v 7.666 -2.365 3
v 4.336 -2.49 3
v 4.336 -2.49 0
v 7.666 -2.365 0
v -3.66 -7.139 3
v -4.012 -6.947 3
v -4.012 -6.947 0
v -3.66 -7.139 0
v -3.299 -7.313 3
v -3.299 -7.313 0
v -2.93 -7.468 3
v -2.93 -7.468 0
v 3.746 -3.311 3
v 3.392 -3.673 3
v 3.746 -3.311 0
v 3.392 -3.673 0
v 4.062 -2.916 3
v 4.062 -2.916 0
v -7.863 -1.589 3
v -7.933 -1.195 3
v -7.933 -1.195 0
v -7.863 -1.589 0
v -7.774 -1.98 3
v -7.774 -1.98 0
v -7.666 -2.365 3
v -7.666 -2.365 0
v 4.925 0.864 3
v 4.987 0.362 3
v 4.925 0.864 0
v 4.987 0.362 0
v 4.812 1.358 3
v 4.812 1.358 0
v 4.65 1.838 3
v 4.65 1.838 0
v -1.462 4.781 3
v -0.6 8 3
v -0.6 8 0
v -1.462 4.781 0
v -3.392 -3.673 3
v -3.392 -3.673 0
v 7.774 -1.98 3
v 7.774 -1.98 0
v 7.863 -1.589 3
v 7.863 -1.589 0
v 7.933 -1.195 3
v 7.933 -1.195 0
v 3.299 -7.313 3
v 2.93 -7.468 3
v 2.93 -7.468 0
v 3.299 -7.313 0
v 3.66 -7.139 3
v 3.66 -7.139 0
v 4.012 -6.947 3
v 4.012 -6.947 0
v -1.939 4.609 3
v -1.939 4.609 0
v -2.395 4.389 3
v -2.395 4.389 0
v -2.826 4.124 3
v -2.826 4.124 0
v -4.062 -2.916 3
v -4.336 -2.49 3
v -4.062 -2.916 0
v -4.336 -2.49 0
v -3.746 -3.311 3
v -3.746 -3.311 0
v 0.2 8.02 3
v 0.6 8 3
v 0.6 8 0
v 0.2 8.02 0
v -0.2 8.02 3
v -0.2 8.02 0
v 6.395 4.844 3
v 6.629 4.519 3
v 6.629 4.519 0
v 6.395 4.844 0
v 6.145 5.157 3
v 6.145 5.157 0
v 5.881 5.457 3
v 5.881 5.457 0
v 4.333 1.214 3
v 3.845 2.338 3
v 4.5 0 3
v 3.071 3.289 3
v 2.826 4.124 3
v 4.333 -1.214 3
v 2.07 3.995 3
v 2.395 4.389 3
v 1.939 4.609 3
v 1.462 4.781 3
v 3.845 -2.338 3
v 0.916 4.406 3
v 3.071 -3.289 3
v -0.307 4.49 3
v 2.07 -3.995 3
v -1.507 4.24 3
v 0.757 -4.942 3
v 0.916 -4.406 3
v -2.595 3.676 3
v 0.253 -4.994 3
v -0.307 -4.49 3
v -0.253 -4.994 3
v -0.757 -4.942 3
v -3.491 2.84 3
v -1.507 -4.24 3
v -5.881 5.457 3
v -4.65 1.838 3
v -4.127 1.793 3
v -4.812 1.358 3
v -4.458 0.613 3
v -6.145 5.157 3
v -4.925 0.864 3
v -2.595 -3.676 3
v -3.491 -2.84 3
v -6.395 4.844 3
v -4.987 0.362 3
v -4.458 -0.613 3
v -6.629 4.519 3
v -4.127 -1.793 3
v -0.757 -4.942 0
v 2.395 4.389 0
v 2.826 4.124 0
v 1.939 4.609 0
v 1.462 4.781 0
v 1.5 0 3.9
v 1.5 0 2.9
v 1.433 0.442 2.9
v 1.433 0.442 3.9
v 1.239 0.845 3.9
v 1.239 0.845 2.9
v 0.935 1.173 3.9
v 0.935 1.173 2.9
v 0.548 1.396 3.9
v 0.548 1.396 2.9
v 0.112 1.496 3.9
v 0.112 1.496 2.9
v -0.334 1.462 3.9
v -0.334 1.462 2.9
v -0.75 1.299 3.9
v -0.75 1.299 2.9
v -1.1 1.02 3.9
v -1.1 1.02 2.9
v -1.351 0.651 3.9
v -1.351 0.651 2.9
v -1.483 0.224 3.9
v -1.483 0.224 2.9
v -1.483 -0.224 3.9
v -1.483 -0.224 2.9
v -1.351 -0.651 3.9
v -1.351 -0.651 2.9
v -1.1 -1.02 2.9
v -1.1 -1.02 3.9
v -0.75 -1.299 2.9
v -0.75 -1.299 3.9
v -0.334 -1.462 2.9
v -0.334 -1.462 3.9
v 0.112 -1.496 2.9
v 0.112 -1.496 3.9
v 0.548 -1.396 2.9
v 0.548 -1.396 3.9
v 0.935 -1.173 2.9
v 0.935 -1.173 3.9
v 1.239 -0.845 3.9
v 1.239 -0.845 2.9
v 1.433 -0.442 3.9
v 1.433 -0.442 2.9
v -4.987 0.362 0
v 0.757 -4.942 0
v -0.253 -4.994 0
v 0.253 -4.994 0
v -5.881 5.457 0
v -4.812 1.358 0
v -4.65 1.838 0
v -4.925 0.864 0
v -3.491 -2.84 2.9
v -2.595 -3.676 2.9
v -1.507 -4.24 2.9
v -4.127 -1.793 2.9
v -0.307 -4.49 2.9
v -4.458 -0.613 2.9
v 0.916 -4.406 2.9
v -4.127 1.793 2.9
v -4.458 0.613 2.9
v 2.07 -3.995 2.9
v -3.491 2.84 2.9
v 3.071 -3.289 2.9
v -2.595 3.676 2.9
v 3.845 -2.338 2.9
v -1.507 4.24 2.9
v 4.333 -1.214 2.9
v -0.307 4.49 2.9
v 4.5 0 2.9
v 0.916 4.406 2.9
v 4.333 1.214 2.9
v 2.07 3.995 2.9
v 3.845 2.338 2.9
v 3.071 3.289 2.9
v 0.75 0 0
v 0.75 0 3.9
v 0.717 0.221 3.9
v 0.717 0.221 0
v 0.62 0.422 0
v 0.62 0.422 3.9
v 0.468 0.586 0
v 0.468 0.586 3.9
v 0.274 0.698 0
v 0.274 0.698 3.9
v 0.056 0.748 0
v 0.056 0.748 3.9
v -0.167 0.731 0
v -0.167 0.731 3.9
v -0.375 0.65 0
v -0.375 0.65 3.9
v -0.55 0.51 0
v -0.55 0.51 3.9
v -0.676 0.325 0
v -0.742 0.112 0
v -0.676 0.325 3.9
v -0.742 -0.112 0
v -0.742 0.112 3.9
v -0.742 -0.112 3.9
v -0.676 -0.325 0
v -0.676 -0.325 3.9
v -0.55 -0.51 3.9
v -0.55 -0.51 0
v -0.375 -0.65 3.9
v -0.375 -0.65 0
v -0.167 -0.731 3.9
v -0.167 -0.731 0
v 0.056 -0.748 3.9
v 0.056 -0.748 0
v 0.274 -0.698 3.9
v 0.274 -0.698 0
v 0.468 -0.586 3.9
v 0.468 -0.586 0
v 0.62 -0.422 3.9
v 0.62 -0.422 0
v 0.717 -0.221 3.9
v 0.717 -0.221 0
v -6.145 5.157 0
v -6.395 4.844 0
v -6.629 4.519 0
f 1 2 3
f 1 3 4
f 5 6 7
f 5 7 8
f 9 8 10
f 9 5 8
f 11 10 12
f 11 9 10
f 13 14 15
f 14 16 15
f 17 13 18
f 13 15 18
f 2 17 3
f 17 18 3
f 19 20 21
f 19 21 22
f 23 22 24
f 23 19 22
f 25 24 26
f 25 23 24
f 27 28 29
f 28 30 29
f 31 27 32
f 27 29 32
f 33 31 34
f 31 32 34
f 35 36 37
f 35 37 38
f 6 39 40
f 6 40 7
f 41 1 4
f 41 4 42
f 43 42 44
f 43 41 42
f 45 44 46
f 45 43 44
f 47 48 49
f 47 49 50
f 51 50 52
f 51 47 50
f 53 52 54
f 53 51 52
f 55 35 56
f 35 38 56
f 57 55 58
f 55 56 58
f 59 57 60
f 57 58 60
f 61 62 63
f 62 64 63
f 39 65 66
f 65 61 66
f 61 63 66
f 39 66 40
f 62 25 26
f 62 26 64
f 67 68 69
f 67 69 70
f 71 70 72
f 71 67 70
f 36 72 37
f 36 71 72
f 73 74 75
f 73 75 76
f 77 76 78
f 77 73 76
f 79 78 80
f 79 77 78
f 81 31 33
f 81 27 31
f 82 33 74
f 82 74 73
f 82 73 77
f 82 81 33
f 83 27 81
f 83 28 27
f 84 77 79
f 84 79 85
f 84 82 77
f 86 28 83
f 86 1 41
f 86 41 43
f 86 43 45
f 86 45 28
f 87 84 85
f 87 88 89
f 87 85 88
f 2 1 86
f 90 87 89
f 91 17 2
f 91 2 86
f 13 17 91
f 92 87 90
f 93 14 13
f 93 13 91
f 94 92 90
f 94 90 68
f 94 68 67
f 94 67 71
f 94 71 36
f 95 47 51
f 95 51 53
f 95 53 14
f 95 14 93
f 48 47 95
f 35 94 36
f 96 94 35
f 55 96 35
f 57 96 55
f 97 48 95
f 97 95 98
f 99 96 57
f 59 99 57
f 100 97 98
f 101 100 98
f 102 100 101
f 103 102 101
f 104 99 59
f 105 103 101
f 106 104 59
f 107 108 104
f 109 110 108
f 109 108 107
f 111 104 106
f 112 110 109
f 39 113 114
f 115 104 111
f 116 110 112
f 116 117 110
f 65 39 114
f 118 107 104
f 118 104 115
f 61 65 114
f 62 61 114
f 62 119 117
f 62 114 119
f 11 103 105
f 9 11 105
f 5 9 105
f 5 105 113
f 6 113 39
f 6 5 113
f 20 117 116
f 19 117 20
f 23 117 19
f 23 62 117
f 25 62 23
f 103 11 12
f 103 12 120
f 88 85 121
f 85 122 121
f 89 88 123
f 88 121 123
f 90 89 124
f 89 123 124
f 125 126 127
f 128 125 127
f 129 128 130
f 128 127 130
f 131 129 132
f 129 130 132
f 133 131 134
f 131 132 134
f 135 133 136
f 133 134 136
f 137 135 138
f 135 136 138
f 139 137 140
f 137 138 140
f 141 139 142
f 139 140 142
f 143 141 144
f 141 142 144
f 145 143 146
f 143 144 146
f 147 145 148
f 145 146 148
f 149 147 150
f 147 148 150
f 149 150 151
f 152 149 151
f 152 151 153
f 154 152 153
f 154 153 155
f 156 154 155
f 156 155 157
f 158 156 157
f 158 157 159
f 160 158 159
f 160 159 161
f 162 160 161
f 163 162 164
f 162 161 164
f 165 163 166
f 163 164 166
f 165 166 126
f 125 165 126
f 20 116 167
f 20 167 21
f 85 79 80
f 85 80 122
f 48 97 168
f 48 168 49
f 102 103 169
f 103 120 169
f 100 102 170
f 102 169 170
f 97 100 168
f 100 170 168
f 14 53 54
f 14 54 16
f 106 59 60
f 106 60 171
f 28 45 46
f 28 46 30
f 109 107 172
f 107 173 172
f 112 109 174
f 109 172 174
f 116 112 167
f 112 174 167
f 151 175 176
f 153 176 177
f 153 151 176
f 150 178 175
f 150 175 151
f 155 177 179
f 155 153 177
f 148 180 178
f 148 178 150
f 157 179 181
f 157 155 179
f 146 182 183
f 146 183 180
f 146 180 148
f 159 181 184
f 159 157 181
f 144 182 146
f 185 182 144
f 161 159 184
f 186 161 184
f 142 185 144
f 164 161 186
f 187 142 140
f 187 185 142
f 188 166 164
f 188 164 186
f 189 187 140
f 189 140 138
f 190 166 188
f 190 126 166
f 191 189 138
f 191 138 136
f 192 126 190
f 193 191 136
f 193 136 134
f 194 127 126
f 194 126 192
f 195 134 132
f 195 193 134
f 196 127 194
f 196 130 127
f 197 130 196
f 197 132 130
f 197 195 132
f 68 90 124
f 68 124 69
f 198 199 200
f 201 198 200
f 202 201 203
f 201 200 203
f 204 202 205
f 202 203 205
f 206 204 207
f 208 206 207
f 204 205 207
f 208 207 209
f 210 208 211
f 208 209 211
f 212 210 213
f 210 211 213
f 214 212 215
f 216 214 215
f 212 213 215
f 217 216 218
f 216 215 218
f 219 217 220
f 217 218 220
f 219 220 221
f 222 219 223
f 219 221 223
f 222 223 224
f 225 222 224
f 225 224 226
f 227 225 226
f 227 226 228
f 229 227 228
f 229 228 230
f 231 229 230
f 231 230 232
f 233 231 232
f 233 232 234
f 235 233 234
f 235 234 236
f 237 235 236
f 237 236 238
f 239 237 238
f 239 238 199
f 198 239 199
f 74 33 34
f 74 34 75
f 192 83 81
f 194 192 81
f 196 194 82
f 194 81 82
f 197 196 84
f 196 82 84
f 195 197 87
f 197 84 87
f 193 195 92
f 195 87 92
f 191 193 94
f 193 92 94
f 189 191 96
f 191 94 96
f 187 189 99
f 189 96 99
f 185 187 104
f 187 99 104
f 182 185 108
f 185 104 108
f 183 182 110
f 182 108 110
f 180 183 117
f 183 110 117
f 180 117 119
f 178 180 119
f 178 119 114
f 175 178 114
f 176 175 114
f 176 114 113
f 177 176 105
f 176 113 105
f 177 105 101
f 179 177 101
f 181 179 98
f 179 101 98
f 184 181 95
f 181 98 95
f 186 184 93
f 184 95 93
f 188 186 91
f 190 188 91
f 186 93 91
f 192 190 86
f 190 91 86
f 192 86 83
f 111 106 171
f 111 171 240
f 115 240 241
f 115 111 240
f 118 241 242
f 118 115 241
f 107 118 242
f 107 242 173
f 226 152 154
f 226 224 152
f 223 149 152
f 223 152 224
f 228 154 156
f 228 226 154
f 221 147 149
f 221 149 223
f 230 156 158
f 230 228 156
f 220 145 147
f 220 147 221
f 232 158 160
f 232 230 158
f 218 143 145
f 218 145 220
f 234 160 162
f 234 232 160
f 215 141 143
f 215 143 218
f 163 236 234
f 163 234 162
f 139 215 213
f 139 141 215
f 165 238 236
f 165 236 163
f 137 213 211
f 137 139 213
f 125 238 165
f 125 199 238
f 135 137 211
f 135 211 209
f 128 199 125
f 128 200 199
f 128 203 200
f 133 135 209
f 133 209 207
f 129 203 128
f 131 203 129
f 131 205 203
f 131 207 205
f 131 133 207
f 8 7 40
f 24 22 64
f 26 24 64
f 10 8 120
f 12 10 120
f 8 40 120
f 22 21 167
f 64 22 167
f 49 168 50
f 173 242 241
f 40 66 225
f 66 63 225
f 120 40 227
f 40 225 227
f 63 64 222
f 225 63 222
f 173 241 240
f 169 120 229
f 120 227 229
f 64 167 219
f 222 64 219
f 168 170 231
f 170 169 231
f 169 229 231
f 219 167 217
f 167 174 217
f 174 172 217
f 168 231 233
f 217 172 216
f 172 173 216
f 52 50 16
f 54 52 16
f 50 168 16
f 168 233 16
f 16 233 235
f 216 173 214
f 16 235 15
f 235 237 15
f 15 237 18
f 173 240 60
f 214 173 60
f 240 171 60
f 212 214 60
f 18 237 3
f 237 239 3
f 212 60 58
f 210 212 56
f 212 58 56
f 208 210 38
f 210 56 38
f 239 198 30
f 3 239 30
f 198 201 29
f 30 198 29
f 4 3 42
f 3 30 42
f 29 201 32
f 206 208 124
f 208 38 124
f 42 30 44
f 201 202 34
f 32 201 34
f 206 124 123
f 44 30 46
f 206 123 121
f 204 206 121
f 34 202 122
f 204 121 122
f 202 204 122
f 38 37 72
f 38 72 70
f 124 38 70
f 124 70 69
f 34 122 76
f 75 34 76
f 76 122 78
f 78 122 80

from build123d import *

# Parameters (mm, degrees)
SKETCH1_R           = 5
BOSS_EXTRUDE1_DEPTH = 3
BOSS_EXTRUDE2_DEPTH = 3
CIRPATTERN2_COUNT   = 7
SKETCH3_R           = 4.5
CUT_EXTRUDE1_DEPTH  = 0.1
SKETCH4_R           = 1.5
BOSS_EXTRUDE3_DEPTH = 1
SKETCH5_R           = 0.75
CUT_EXTRUDE2_DEPTH  = 12.937398013


with BuildPart() as part:
    # Sketch1 → Boss-Extrude1 (new body)
    with BuildSketch(Plane.XY):
        Circle(SKETCH1_R)
    extrude(amount=BOSS_EXTRUDE1_DEPTH)

    # Sketch2 → Boss-Extrude2 (add)
    with BuildSketch(Plane.XY.offset(3)):
        with BuildLine():
            Line((-1.46243537, 4.781347382), (1.46243537, 4.781347382))
            Line((1.46243537, 4.781347382), (0.6, 8))
            ThreePointArc((0.6, 8), (0, 8.022468448), (-0.6, 8))
            Line((-0.6, 8), (-1.46243537, 4.781347382))
        make_face()
    boss_extrude2 = extrude(amount=-BOSS_EXTRUDE2_DEPTH)

    # CirPattern2: Boss-Extrude2 ×7 about axis
    cirpattern2_axis = Axis((0, 0, 0), (0, 0, 1))
    for i in range(1, CIRPATTERN2_COUNT):
        add(boss_extrude2.rotate(cirpattern2_axis, i * 360 / CIRPATTERN2_COUNT))

    # Sketch3 → Cut-Extrude1 (cut)
    with BuildSketch(Plane.XY.offset(3)):
        Circle(SKETCH3_R)
    extrude(amount=-CUT_EXTRUDE1_DEPTH, mode=Mode.SUBTRACT)

    # Sketch4 → Boss-Extrude3 (add)
    with BuildSketch(Plane.XY.offset(2.9)):
        Circle(SKETCH4_R)
    extrude(amount=BOSS_EXTRUDE3_DEPTH)

    # Sketch5 → Cut-Extrude2 (cut, through all)
    with BuildSketch(Plane.XY.offset(3.9)):
        Circle(SKETCH5_R)
    extrude(amount=-CUT_EXTRUDE2_DEPTH, mode=Mode.SUBTRACT)


solid = part.part
